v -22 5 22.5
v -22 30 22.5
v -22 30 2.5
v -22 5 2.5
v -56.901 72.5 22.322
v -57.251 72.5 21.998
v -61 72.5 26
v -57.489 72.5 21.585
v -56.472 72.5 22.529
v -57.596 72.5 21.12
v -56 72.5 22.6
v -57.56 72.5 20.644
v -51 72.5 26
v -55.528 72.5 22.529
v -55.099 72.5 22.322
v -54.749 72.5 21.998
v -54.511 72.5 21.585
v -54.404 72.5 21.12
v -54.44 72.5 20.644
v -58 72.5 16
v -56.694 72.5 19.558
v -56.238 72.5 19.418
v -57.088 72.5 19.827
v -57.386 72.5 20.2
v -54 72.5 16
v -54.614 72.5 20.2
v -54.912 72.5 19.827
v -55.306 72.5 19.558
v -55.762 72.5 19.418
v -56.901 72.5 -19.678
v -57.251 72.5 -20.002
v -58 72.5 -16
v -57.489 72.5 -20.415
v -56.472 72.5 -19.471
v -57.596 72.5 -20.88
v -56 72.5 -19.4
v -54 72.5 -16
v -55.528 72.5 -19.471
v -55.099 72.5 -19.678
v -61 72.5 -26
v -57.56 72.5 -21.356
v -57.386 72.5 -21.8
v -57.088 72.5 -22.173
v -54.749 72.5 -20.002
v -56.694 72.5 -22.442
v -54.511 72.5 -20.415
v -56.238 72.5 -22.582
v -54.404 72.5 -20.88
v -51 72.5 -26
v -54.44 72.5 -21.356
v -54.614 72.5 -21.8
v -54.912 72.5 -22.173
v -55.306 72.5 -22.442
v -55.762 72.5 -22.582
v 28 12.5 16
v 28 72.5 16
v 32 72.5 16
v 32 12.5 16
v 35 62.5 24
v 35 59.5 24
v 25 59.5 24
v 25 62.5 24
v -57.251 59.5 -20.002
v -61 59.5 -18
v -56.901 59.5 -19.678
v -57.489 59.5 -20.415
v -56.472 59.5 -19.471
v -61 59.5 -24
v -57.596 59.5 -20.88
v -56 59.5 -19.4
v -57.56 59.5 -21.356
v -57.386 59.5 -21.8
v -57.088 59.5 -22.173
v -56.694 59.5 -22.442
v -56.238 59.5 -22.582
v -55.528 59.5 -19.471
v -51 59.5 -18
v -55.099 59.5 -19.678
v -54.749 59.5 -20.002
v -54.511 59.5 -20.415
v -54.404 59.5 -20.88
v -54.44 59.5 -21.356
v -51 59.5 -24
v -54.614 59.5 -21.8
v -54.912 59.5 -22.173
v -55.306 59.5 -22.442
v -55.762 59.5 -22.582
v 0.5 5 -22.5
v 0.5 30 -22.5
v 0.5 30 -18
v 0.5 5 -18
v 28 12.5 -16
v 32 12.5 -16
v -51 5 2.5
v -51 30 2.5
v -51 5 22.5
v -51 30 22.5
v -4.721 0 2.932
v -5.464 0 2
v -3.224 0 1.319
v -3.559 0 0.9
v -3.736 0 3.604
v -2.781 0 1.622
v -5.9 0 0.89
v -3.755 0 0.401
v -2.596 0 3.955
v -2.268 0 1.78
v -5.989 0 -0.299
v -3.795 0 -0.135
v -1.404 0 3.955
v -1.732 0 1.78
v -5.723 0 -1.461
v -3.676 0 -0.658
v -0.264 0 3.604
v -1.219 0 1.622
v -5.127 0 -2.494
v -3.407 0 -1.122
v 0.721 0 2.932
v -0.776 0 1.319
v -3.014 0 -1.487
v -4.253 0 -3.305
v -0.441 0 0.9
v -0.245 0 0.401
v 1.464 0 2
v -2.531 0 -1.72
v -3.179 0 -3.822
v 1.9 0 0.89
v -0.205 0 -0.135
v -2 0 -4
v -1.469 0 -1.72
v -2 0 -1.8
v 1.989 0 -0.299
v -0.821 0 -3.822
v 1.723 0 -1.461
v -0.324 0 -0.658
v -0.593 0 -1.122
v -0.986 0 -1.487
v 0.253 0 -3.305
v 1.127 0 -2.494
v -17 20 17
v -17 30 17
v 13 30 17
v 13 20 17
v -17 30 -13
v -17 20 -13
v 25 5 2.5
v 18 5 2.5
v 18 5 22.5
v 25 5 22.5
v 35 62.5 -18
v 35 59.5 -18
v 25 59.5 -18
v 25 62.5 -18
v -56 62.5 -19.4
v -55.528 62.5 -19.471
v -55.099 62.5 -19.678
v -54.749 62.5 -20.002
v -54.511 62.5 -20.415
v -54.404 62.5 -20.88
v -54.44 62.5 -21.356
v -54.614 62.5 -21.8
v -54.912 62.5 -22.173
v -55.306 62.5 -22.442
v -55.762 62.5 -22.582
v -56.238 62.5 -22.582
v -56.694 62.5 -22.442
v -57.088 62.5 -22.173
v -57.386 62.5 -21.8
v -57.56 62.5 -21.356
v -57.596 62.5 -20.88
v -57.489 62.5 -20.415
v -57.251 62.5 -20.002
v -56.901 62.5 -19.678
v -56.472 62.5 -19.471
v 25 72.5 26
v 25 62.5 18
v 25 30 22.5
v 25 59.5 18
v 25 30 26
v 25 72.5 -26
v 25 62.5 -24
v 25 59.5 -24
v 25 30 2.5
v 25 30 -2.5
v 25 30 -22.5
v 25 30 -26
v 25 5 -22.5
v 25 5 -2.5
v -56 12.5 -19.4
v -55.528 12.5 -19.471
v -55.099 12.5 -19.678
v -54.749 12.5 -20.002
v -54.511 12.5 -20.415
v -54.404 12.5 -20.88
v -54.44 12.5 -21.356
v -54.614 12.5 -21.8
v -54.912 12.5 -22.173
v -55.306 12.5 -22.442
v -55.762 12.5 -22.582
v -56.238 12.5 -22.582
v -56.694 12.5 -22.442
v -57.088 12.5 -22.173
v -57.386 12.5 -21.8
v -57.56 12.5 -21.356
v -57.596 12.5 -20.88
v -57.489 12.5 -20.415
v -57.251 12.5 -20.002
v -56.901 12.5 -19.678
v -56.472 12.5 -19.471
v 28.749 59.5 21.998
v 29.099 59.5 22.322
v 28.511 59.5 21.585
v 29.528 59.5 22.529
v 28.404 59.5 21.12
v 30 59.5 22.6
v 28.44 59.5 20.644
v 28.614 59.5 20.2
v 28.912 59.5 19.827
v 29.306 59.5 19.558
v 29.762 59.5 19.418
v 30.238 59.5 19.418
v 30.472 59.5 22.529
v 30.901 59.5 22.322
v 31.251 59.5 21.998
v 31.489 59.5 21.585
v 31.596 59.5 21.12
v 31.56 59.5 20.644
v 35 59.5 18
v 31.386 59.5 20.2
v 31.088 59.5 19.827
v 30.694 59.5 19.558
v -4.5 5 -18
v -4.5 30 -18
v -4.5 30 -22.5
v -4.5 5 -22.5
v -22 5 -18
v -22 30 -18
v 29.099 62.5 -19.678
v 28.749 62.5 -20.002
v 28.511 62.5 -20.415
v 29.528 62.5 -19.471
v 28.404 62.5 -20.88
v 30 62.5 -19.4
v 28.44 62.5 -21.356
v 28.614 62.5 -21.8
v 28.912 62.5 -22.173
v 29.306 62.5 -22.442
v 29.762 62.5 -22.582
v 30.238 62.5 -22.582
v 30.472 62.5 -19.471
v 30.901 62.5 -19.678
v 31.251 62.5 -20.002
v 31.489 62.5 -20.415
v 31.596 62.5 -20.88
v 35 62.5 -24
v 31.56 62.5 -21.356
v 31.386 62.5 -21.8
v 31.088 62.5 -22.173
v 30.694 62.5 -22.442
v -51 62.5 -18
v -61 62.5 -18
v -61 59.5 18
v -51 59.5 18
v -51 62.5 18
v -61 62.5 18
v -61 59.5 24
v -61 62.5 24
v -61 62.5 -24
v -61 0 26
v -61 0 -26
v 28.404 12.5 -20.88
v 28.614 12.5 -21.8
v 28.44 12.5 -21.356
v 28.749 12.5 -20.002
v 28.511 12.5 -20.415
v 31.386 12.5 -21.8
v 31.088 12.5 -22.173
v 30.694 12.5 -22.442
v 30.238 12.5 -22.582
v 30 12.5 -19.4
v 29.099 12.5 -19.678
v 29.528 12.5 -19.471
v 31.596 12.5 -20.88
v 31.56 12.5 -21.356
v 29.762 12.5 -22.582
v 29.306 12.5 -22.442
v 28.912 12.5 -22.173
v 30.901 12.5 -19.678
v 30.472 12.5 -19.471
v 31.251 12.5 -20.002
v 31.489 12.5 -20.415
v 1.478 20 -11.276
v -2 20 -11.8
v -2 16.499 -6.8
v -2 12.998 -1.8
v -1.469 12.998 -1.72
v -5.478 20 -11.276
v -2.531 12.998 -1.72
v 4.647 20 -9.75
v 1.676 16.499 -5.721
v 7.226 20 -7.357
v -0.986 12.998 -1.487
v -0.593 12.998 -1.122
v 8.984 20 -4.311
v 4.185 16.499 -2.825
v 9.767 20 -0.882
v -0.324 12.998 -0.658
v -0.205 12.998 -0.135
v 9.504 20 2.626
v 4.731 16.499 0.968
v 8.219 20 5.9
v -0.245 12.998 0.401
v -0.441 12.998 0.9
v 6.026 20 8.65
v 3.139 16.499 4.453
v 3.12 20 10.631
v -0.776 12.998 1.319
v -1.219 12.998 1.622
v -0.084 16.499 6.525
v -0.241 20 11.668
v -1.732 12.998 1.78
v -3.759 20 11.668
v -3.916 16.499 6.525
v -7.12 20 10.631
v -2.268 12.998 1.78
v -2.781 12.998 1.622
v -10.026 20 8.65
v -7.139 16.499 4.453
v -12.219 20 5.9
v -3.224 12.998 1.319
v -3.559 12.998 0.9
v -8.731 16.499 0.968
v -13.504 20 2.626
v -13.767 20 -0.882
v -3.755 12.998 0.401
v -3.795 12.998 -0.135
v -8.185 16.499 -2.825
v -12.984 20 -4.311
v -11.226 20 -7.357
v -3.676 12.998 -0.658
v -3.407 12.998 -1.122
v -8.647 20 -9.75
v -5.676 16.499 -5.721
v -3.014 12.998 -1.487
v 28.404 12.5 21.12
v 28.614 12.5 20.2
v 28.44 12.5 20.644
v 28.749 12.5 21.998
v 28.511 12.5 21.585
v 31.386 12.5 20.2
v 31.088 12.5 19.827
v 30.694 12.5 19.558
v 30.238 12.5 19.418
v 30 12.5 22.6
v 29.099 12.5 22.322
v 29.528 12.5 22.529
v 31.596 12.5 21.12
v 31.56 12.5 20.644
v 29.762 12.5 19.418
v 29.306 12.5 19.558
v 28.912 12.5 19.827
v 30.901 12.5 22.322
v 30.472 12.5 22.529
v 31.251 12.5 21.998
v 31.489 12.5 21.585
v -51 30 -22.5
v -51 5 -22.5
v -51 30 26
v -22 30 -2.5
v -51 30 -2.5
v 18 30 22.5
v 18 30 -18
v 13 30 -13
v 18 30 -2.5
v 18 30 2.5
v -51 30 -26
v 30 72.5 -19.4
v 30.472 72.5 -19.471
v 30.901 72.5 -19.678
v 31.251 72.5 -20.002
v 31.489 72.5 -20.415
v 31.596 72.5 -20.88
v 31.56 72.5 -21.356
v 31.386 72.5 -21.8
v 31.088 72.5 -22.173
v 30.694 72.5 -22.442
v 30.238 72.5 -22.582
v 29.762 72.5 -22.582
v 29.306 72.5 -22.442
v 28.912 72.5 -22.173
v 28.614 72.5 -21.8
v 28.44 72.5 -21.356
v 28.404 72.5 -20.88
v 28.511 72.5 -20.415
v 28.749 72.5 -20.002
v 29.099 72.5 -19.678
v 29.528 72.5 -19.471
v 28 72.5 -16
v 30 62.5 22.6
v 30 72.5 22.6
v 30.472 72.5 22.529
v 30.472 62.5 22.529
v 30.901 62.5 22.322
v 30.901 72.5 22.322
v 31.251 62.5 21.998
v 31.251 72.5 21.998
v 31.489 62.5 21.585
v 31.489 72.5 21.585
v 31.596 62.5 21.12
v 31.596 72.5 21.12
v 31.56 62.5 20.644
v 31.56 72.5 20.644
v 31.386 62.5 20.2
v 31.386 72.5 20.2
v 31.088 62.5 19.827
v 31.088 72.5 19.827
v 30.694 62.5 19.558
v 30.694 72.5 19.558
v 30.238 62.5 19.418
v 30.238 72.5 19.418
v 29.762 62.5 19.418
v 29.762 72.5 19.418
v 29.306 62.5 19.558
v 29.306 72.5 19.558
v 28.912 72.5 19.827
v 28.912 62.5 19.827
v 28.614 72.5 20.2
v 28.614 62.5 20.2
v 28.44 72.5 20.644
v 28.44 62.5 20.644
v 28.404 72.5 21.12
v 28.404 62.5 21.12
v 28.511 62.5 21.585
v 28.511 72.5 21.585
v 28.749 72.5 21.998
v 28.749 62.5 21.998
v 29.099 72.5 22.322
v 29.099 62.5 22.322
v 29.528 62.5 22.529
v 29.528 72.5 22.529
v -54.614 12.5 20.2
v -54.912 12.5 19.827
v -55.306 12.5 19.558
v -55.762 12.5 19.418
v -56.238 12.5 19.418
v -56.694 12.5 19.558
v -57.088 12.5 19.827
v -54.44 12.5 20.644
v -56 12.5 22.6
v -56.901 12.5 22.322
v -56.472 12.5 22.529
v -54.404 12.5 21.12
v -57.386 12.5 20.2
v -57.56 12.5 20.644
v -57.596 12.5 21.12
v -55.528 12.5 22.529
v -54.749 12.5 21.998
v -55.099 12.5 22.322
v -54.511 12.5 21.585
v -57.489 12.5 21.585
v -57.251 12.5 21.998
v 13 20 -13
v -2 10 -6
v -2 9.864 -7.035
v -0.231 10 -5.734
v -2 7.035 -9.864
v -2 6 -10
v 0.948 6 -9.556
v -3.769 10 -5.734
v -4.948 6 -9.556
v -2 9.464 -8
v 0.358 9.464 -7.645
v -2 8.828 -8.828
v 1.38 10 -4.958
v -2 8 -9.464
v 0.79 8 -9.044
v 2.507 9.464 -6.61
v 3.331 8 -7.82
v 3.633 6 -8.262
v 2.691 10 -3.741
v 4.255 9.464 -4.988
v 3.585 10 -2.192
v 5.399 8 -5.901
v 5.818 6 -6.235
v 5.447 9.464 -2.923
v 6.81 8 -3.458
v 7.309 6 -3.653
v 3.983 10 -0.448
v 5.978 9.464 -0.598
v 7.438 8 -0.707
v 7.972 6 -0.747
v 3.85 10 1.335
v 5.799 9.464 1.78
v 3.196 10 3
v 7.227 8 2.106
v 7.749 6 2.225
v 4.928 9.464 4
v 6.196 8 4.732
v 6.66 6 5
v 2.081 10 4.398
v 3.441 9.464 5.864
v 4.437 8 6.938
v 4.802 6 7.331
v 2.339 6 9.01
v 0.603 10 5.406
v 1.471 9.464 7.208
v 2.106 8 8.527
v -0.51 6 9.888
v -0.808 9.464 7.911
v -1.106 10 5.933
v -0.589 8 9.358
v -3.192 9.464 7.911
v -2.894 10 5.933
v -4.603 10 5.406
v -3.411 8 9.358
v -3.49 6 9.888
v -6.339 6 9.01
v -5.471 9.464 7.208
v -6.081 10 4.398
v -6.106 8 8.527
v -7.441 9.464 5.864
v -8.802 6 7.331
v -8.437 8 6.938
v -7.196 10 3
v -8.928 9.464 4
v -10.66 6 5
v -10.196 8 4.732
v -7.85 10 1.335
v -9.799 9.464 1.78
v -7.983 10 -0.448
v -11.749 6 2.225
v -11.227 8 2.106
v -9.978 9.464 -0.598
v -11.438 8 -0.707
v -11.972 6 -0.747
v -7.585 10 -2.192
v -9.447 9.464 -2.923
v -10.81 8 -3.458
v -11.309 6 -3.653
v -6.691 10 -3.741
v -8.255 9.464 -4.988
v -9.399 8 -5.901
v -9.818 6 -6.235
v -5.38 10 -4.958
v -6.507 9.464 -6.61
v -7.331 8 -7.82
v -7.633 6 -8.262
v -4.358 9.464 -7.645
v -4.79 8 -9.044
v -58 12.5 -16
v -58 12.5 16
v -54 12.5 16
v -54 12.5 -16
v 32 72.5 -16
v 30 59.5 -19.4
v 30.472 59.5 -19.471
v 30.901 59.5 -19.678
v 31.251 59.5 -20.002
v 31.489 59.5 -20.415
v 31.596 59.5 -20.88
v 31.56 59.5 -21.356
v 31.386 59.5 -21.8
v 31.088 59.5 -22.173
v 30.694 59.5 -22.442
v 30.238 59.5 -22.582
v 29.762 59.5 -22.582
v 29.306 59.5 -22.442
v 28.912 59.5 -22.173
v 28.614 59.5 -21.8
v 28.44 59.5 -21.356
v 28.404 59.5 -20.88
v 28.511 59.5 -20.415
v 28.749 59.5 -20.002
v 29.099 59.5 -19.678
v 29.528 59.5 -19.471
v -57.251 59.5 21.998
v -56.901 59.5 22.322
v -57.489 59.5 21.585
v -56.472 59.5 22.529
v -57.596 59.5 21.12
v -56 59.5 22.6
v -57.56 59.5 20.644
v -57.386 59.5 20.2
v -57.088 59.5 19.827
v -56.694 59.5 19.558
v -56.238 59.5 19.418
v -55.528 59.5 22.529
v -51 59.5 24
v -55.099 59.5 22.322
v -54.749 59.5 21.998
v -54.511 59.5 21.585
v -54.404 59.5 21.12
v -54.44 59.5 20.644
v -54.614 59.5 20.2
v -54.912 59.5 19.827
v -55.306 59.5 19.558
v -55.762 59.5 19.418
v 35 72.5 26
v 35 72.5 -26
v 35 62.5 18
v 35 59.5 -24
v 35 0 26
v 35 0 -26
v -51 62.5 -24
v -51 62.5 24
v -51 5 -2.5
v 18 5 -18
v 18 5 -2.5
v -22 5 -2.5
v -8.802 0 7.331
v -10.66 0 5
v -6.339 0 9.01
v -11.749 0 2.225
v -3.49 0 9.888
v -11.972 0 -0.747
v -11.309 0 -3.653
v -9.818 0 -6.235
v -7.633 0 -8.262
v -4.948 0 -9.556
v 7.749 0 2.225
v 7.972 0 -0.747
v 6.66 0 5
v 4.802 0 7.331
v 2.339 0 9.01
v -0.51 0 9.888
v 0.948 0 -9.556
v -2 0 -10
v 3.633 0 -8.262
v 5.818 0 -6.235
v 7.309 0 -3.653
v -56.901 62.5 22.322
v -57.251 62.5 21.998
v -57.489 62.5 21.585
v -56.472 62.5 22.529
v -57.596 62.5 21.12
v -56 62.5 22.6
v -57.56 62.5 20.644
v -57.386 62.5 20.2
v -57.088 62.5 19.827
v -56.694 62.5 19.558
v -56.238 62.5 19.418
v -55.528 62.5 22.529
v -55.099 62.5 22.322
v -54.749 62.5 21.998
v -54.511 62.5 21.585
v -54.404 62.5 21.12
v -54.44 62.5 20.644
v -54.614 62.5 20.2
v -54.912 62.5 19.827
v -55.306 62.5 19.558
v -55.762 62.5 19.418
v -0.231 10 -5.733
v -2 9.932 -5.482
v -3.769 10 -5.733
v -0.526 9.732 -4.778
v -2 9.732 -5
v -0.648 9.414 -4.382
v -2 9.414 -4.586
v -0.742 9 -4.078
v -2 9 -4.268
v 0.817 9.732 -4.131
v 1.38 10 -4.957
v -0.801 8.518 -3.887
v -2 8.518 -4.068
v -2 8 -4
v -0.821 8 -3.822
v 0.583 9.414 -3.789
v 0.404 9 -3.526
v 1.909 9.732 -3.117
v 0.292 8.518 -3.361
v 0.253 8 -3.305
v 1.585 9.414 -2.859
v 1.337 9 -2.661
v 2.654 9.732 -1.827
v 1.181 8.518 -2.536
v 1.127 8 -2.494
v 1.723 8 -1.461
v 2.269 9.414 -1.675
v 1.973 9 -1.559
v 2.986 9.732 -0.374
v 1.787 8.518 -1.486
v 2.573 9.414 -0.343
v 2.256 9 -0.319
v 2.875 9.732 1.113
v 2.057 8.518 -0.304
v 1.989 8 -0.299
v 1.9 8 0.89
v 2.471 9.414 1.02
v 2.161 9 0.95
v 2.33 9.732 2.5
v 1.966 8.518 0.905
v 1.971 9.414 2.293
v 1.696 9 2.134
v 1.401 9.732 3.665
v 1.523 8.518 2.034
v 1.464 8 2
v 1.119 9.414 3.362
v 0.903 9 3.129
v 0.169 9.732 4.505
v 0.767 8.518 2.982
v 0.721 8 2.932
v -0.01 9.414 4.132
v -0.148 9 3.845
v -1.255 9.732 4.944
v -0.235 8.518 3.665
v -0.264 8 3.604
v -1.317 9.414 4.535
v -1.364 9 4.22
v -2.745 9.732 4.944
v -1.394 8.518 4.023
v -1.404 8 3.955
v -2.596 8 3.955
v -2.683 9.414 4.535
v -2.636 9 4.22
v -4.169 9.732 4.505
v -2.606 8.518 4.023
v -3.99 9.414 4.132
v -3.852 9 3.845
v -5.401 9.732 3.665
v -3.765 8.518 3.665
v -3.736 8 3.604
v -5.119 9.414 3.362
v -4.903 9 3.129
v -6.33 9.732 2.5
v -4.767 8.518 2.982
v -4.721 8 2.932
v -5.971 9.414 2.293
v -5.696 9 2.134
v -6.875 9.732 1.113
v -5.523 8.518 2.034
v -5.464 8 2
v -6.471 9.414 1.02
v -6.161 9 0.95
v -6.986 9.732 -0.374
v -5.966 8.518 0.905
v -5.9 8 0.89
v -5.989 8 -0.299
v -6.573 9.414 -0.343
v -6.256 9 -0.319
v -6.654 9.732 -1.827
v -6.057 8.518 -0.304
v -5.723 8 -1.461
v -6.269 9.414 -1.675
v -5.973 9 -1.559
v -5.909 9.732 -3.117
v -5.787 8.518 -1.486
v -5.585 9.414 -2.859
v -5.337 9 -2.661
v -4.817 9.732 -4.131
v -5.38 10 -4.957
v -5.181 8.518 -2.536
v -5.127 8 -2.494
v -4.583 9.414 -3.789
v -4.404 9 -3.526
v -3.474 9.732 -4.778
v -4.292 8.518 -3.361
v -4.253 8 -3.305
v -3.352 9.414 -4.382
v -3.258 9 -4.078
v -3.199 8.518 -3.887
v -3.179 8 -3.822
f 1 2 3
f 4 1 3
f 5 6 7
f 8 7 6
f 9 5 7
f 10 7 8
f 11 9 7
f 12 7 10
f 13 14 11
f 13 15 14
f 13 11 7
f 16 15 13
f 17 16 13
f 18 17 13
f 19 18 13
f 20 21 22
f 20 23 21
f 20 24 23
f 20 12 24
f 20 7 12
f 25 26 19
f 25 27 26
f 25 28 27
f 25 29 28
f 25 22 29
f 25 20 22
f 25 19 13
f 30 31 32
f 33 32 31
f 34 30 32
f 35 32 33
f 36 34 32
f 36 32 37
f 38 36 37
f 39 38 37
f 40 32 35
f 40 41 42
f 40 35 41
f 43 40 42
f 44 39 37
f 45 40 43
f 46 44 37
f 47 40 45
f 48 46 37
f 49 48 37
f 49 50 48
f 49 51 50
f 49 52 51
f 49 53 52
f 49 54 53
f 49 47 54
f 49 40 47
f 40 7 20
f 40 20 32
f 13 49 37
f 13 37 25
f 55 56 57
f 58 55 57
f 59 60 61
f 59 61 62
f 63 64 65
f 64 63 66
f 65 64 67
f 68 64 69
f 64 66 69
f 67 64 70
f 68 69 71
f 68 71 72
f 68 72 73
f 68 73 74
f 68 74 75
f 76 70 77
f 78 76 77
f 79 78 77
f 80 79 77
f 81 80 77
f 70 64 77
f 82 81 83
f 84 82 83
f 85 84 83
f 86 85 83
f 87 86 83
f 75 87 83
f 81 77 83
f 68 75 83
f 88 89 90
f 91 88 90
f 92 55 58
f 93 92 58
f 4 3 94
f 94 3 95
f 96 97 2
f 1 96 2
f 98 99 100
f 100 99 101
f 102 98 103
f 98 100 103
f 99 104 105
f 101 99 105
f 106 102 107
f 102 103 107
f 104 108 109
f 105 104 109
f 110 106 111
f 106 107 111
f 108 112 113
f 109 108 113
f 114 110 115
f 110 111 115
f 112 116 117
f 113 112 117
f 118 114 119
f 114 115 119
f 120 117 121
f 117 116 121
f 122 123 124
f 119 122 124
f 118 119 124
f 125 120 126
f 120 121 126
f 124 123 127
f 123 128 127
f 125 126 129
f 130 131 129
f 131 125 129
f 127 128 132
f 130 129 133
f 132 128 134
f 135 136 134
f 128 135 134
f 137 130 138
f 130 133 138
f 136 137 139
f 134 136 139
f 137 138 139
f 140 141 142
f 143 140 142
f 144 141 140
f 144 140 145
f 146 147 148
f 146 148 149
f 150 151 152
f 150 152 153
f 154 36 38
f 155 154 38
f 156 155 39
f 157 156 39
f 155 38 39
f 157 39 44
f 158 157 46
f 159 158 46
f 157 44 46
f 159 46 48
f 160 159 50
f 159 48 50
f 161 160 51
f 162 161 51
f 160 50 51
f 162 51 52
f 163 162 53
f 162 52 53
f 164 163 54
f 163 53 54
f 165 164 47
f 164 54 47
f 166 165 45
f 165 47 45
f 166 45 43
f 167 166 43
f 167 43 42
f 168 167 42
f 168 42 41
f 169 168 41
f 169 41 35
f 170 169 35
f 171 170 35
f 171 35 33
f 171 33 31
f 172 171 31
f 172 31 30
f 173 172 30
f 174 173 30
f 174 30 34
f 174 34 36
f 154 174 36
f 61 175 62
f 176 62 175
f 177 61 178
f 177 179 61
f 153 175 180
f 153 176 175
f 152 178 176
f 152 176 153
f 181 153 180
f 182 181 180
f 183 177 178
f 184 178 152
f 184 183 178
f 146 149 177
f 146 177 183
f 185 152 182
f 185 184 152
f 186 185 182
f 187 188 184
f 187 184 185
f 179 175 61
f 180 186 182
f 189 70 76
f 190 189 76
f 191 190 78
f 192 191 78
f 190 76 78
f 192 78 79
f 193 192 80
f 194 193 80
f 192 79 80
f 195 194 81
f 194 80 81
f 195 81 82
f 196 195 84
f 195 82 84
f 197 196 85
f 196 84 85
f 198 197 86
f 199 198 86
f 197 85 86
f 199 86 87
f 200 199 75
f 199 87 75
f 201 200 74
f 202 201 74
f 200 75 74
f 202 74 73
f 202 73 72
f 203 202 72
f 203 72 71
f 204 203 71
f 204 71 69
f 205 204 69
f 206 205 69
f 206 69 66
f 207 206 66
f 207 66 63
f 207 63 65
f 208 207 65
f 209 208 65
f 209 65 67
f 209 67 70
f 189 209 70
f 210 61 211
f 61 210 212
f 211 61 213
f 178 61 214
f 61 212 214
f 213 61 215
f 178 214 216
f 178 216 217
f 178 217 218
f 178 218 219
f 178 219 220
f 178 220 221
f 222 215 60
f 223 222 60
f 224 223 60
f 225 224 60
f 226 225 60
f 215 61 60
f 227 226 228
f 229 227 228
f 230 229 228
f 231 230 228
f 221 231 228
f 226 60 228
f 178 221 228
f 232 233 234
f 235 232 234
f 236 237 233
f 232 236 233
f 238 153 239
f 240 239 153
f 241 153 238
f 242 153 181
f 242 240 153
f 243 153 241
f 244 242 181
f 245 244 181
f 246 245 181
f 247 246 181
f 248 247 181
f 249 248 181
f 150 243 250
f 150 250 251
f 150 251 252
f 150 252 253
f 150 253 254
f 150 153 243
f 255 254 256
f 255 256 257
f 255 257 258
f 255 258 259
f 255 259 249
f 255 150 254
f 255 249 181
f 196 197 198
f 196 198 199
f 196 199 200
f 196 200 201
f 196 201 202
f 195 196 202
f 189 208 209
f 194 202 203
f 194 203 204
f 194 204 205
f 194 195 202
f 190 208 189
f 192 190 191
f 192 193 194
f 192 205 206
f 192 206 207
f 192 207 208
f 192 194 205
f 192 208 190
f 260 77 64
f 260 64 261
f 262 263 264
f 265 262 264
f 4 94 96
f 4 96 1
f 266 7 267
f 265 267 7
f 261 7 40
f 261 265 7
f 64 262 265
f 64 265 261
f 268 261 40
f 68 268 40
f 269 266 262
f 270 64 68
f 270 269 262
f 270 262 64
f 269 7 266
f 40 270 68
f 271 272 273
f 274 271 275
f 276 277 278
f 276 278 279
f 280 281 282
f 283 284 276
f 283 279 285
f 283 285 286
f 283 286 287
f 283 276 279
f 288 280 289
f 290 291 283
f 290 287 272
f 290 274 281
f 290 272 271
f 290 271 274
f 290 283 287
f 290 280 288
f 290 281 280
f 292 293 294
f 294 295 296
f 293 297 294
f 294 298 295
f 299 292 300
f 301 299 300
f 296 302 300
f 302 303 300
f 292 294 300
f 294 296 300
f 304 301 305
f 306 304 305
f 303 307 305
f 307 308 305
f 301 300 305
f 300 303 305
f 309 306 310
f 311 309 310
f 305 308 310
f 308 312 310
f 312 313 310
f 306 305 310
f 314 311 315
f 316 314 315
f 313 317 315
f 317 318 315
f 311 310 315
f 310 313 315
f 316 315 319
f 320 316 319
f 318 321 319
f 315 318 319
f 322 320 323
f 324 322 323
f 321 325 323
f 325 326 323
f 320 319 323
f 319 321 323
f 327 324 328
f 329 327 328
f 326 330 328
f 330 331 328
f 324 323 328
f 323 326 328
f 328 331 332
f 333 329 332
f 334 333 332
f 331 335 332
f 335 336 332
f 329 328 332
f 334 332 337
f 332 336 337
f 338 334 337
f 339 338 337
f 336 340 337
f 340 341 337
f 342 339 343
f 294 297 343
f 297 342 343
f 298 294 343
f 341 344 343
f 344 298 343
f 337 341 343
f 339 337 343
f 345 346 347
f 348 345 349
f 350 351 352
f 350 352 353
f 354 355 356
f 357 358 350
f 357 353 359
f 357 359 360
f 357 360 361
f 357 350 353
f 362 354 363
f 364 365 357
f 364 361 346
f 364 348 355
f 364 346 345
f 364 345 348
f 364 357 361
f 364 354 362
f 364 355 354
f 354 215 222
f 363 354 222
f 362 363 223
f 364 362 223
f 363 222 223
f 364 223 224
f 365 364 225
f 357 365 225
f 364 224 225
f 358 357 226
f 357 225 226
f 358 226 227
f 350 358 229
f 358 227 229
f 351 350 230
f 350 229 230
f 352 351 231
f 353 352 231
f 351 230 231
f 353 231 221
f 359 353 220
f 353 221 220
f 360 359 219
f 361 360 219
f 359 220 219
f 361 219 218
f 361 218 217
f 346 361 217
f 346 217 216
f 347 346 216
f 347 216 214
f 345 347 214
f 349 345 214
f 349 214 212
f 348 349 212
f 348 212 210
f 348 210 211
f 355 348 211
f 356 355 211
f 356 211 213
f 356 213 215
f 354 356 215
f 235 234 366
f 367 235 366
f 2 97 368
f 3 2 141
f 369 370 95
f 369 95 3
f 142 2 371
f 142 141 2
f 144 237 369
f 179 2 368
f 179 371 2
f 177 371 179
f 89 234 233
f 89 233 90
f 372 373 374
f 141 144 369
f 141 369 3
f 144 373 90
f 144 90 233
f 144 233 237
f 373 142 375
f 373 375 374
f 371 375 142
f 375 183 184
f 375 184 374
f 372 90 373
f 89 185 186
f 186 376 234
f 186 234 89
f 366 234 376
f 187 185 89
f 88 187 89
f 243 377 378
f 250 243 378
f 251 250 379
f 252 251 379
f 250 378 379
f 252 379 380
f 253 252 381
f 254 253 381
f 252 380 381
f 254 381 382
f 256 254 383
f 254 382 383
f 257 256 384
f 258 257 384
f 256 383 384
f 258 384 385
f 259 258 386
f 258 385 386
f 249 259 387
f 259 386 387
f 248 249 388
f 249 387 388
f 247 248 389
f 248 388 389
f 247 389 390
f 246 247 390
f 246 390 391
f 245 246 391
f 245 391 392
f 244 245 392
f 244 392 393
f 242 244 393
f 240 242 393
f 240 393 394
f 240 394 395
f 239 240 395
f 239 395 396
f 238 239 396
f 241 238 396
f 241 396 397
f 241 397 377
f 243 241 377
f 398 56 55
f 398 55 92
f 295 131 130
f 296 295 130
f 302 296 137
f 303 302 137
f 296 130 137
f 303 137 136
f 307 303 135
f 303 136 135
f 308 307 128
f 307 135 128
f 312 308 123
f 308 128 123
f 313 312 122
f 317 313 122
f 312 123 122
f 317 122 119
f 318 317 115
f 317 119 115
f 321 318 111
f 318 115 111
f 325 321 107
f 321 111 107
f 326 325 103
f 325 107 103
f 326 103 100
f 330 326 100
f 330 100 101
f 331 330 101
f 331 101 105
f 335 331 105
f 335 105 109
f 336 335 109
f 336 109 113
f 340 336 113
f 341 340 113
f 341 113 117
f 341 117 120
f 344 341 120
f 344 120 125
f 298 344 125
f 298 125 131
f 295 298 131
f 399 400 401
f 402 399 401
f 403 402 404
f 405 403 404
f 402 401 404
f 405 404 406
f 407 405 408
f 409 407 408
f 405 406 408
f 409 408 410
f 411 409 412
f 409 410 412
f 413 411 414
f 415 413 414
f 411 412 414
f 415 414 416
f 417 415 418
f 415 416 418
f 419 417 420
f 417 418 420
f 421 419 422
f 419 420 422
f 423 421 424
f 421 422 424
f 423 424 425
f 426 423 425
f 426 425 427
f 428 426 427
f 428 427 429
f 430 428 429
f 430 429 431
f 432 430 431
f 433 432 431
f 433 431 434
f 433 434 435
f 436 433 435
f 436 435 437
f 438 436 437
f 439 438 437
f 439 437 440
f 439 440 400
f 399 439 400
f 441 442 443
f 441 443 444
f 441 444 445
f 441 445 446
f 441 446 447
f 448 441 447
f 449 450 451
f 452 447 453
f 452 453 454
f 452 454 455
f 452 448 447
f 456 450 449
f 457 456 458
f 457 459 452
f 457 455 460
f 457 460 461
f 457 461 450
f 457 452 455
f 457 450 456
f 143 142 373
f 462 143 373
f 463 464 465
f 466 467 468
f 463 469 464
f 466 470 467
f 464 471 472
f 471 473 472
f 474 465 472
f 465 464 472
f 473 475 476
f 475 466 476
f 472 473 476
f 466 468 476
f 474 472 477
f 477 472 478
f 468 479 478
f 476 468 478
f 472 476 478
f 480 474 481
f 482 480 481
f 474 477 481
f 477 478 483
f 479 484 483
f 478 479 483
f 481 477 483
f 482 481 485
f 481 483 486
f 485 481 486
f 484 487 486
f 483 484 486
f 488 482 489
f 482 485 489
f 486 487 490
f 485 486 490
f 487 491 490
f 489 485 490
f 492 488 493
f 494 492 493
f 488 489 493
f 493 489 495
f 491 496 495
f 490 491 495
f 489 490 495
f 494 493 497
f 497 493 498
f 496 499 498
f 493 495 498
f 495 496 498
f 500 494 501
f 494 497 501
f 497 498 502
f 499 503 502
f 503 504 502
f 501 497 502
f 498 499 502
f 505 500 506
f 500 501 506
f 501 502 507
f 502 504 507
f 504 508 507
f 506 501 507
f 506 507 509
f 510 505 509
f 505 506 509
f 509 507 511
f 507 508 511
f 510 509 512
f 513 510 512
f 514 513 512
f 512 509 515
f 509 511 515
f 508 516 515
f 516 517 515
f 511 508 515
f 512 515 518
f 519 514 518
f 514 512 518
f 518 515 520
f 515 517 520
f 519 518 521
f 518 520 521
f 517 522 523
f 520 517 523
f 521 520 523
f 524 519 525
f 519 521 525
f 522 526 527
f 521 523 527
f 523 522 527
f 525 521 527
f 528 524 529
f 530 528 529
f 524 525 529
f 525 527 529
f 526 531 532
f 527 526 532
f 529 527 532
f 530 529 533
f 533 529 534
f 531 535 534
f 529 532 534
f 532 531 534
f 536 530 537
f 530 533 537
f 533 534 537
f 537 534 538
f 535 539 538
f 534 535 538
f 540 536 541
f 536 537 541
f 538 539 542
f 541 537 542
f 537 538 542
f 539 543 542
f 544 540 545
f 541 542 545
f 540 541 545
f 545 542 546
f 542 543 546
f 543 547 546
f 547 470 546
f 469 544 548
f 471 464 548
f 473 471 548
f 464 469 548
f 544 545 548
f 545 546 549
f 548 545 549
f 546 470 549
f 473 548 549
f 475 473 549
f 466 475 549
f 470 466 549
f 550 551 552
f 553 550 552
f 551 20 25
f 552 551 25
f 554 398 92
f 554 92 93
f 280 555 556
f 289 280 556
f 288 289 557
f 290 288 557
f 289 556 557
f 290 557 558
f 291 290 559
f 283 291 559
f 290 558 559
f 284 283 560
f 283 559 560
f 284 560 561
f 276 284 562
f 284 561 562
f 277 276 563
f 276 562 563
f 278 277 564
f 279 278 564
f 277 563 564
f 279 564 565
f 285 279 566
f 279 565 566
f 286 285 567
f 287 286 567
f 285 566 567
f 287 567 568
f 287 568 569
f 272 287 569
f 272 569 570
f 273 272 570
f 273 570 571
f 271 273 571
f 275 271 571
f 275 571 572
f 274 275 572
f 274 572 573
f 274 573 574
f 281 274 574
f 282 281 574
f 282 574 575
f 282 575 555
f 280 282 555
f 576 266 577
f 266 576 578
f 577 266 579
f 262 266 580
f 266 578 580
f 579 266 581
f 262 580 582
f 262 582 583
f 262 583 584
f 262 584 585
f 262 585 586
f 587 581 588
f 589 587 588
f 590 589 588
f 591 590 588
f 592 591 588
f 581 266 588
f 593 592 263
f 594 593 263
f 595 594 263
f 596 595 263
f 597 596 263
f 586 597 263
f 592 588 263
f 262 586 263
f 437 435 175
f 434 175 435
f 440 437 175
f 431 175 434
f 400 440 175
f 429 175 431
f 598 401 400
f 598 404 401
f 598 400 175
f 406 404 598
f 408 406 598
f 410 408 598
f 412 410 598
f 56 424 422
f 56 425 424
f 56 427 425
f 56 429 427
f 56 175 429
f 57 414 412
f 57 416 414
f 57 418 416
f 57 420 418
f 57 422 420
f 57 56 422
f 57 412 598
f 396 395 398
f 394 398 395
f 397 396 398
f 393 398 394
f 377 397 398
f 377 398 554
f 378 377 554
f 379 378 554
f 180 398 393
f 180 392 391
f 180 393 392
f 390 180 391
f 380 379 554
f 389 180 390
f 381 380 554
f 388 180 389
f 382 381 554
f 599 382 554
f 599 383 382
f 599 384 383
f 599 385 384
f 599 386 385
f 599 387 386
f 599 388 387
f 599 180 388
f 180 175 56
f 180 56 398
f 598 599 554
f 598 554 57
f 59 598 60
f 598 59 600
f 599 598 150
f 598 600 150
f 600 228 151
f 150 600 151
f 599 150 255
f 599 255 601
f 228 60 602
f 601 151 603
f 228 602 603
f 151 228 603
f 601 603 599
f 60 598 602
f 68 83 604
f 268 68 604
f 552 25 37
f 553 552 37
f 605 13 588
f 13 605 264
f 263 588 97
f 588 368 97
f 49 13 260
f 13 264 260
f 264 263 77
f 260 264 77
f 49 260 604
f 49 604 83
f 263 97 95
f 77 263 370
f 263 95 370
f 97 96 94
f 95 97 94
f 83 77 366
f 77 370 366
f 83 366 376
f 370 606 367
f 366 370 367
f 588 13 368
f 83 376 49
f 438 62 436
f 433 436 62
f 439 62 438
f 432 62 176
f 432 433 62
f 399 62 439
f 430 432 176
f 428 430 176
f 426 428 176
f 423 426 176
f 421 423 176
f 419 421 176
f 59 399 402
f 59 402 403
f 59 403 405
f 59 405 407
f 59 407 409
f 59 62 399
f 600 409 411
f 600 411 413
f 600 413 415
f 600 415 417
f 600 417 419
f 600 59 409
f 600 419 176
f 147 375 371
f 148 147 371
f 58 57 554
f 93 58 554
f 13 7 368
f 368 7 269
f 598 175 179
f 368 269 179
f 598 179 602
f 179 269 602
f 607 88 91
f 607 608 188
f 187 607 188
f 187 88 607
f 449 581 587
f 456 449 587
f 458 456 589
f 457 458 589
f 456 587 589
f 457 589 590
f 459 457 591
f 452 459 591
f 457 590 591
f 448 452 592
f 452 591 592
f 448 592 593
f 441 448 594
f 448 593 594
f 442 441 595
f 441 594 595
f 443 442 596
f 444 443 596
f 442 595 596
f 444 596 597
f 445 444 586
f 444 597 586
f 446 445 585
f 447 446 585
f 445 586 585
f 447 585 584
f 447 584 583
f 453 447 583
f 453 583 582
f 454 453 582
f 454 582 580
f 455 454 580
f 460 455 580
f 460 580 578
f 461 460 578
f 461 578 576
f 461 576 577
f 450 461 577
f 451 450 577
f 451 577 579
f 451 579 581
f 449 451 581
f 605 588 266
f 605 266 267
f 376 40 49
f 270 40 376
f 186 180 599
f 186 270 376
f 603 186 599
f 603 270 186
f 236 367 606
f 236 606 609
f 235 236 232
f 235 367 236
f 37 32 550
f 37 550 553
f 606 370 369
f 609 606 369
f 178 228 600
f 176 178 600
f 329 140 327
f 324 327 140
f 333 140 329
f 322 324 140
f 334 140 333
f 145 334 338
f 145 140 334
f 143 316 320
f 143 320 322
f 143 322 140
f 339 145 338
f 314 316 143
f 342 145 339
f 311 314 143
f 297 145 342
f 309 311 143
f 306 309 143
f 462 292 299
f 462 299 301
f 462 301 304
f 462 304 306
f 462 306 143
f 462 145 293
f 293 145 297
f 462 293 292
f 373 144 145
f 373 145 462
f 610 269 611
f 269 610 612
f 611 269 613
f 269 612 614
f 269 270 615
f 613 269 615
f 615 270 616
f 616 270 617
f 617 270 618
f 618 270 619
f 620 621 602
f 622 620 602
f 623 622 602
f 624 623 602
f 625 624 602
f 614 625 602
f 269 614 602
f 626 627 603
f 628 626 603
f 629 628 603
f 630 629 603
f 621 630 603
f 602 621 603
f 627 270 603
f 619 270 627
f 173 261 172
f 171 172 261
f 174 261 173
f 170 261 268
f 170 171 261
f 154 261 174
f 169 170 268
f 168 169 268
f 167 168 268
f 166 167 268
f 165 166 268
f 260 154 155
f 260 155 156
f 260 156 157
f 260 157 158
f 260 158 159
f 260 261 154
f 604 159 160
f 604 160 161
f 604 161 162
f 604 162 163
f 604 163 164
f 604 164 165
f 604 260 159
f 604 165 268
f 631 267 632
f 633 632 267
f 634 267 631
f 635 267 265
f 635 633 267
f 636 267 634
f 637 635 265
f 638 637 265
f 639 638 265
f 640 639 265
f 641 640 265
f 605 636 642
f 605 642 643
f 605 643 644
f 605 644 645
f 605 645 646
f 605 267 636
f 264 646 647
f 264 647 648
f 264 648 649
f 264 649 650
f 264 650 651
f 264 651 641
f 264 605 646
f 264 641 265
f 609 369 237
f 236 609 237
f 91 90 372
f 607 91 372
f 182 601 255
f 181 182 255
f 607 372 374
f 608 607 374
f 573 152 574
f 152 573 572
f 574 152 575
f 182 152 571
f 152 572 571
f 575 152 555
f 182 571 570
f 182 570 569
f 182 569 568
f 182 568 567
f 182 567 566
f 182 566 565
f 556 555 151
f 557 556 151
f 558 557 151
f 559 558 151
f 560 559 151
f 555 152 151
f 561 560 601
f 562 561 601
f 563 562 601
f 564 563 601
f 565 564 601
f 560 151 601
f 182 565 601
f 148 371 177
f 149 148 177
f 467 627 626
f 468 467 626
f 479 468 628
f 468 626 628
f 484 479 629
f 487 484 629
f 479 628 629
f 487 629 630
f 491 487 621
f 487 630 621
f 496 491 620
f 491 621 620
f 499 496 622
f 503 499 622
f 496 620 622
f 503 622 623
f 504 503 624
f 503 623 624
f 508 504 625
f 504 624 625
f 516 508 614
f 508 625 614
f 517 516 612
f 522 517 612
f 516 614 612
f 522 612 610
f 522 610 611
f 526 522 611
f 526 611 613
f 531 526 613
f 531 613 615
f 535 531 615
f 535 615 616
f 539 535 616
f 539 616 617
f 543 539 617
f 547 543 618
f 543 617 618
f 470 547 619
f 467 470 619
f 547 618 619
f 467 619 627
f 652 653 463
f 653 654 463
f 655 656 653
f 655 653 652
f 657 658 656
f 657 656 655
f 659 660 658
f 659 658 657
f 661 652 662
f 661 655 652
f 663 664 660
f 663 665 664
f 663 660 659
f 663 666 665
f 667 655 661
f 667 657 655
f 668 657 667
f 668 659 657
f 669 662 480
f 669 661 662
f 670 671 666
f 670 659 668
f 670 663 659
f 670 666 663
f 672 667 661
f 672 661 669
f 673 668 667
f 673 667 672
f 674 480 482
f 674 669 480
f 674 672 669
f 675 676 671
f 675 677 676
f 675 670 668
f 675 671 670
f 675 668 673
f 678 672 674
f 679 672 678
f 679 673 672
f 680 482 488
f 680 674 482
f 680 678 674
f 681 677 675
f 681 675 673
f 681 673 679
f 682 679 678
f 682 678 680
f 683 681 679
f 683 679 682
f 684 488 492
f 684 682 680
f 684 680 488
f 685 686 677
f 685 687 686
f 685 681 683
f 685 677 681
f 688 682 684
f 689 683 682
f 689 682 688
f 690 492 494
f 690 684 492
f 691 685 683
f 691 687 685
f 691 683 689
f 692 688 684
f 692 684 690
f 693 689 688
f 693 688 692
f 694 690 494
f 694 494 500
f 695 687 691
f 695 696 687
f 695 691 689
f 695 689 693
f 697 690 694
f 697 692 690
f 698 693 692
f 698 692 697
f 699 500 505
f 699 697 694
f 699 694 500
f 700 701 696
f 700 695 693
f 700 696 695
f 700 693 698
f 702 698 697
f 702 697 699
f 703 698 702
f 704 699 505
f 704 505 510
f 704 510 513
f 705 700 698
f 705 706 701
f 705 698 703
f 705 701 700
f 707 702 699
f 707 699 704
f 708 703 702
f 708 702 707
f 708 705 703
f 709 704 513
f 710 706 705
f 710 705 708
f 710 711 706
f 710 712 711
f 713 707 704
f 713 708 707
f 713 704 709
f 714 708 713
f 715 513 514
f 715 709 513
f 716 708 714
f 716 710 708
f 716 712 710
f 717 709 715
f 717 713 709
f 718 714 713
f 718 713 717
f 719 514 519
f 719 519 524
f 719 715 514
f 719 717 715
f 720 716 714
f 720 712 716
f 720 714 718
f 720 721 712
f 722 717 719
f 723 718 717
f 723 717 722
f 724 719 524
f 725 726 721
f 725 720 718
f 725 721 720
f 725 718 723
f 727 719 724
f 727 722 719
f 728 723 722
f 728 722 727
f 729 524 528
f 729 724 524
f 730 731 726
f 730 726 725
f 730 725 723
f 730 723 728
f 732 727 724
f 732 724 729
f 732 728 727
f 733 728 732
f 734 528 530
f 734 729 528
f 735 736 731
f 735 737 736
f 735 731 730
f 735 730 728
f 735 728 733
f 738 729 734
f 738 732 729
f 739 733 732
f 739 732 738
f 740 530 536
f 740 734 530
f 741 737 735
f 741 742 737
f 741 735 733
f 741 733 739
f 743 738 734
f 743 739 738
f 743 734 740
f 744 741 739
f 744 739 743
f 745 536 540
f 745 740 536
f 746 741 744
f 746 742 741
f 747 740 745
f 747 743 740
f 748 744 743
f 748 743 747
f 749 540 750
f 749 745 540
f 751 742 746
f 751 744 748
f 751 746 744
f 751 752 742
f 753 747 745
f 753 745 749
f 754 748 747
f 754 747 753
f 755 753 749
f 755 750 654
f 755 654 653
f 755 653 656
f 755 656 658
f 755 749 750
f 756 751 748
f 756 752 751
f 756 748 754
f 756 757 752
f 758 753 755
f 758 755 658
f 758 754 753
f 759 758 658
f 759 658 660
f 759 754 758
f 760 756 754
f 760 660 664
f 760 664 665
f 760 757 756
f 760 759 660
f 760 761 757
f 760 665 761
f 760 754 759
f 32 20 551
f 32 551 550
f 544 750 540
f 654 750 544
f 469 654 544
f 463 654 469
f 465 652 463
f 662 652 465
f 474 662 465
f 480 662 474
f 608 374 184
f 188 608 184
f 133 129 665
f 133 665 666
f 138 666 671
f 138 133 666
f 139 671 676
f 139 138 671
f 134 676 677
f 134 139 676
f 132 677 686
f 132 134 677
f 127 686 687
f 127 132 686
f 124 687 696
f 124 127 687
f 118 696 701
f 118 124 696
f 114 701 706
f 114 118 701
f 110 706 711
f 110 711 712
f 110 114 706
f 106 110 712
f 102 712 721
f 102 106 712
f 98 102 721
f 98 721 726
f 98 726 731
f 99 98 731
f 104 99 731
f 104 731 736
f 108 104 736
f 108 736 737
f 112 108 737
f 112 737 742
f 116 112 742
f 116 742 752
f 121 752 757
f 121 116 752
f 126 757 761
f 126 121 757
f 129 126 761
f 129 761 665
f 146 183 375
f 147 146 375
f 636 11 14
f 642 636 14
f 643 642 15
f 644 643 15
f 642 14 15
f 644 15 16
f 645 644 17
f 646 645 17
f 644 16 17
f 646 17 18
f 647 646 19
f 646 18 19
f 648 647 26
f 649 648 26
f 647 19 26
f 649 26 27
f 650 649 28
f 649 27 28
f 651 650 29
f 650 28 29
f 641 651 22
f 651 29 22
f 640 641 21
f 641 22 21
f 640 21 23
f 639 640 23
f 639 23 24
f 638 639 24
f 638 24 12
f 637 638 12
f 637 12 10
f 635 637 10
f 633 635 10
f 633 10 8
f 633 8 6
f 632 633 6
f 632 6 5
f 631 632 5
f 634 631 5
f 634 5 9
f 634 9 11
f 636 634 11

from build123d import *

# Parameters (mm, degrees)
SKETCH1_W           = 96
SKETCH1_H           = 52
BOSS_EXTRUDE1_DEPTH = 30
SKETCH3_W           = 30
SKETCH3_H           = 30
CUT_EXTRUDE1_DEPTH  = 10
SKETCH4_W           = 10
SKETCH4_H           = 52
BOSS_EXTRUDE2_DEPTH = 42.5
CUT_EXTRUDE2_DEPTH  = 25
SKETCH6_R           = 1.8
CUT_EXTRUDE3_DEPTH  = 99.250954194
SKETCH7_R           = 10
SKETCH7_R_2         = 4
CUT_EXTRUDE4_DEPTH  = 10
FILLET2_R           = 2
FILLET3_R           = 4
CHAMFER1_SIZE       = 10
CHAMFER1_SIZE2      = 7.002075382
SKETCH10_W          = 6
SKETCH10_H          = 3
CUT_EXTRUDE7_DEPTH  = 124.078227157
SKETCH11_R          = 1.6
SKETCH11_W          = 4
SKETCH11_H          = 32
CUT_EXTRUDE8_DEPTH  = 60


with BuildPart() as part:
    # Sketch1 → Boss-Extrude1 (new body)
    with BuildSketch(Plane(origin=(0, 0, 0), x_dir=(1, 0, 0), z_dir=(0, 1, 0))):
        with Locations((-13, 0)):
            Rectangle(SKETCH1_W, SKETCH1_H)
    extrude(amount=BOSS_EXTRUDE1_DEPTH)

    # Sketch3 → Cut-Extrude1 (cut)
    with BuildSketch(Plane(origin=(0, 30, 0), x_dir=(1, 0, 0), z_dir=(0, 1, 0))):
        with Locations((-2, -2)):
            Rectangle(SKETCH3_W, SKETCH3_H)
    extrude(amount=-CUT_EXTRUDE1_DEPTH, mode=Mode.SUBTRACT)

    # Sketch4 → Boss-Extrude2 (add)
    with BuildSketch(Plane(origin=(0, 30, 0), x_dir=(1, 0, 0), z_dir=(0, 1, 0))):
        with Locations((30, 0)):
            Rectangle(SKETCH4_W, SKETCH4_H)
        with Locations((-56, 0)):
            Rectangle(SKETCH4_W, SKETCH4_H)
    extrude(amount=BOSS_EXTRUDE2_DEPTH)

    # Sketch5 → Cut-Extrude2 (cut)
    with BuildSketch(Plane(origin=(0, 30, 0), x_dir=(1, 0, 0), z_dir=(0, 1, 0))):
        Polygon((25, 22.5), (0.5, 22.5), (0.5, 18), (18, 18), (18, 2.5), (25, 2.5), align=None)
        Polygon((-4.5, 22.5), (-51, 22.5), (-51, 2.5), (-22, 2.5), (-22, 18), (-4.5, 18), align=None)
        Polygon((-22, -2.5), (-51, -2.5), (-51, -22.5), (-22, -22.5), (-22, -20), align=None)
        Polygon((25, -22.5), (25, -2.5), (18, -2.5), (18, -20), (18, -22.5), align=None)
    extrude(amount=-CUT_EXTRUDE2_DEPTH, mode=Mode.SUBTRACT)

    # Sketch6 → Cut-Extrude3 (cut, through all)
    with BuildSketch(Plane.XZ):
        with Locations(Location((-2, 0, 0), (0, 0, 270))):
            Circle(SKETCH6_R)
    extrude(amount=-CUT_EXTRUDE3_DEPTH, mode=Mode.SUBTRACT)

    # Sketch7 → Cut-Extrude4 (cut)
    with BuildSketch(Plane.XZ):
        with Locations(Location((-2, 0, 0), (0, 0, 270))):
            Circle(SKETCH7_R)
        with Locations(Location((-2, 0, 0), (0, 0, 270))):
            Circle(SKETCH7_R_2, mode=Mode.SUBTRACT)
    extrude(amount=-CUT_EXTRUDE4_DEPTH, mode=Mode.SUBTRACT)

    # Fillet2
    fillet2_edges = [part.edges().sort_by_distance(p)[0] for p in [
        (-2, 10, 4),
    ]]
    fillet(fillet2_edges, radius=FILLET2_R)

    # Fillet3
    fillet3_edges = [part.edges().sort_by_distance(p)[0] for p in [
        (-2, 10, 10),
    ]]
    fillet(fillet3_edges, radius=FILLET3_R - 0.0001)  # a hair under: the kernel refuses the full size

    # Chamfer1
    chamfer1_edges = [part.edges().sort_by_distance(p)[0] for p in [
        (-2, 20, 1.8),
    ]]
    chamfer1_side = [part.faces().sort_by_distance(p)[0] for p in [
        (-2, 20, 2.022878214),
    ]]
    chamfer(chamfer1_edges, length=CHAMFER1_SIZE, length2=CHAMFER1_SIZE2, reference=chamfer1_side[0])

    # Sketch10 → Cut-Extrude7 (cut, through all)
    with BuildSketch(Plane(origin=(35, 0, 0), x_dir=(0, 0, -1), z_dir=(1, 0, 0))):
        with Locations((21, 61)):
            Rectangle(SKETCH10_W, SKETCH10_H)
        with Locations((-21, 61)):
            Rectangle(SKETCH10_W, SKETCH10_H)
    extrude(amount=-CUT_EXTRUDE7_DEPTH, mode=Mode.SUBTRACT)

    # Sketch11 → Cut-Extrude8 (cut)
    with BuildSketch(Plane(origin=(0, 72.5, 0), x_dir=(1, 0, 0), z_dir=(0, 1, 0))):
        with Locations(Location((-56, 21, 0), (0, 0, 270))):
            Circle(SKETCH11_R)
        with Locations(Location((-56, -21, 0), (0, 0, 270))):
            Circle(SKETCH11_R)
        with Locations(Location((30, -21, 0), (0, 0, 270))):
            Circle(SKETCH11_R)
        with Locations(Location((30, 21, 0), (0, 0, 270))):
            Circle(SKETCH11_R)
        with Locations((-56, 0)):
            Rectangle(SKETCH11_W, SKETCH11_H)
        with Locations((30, 0)):
            Rectangle(SKETCH11_W, SKETCH11_H)
    extrude(amount=-CUT_EXTRUDE8_DEPTH, mode=Mode.SUBTRACT)


solid = part.part
